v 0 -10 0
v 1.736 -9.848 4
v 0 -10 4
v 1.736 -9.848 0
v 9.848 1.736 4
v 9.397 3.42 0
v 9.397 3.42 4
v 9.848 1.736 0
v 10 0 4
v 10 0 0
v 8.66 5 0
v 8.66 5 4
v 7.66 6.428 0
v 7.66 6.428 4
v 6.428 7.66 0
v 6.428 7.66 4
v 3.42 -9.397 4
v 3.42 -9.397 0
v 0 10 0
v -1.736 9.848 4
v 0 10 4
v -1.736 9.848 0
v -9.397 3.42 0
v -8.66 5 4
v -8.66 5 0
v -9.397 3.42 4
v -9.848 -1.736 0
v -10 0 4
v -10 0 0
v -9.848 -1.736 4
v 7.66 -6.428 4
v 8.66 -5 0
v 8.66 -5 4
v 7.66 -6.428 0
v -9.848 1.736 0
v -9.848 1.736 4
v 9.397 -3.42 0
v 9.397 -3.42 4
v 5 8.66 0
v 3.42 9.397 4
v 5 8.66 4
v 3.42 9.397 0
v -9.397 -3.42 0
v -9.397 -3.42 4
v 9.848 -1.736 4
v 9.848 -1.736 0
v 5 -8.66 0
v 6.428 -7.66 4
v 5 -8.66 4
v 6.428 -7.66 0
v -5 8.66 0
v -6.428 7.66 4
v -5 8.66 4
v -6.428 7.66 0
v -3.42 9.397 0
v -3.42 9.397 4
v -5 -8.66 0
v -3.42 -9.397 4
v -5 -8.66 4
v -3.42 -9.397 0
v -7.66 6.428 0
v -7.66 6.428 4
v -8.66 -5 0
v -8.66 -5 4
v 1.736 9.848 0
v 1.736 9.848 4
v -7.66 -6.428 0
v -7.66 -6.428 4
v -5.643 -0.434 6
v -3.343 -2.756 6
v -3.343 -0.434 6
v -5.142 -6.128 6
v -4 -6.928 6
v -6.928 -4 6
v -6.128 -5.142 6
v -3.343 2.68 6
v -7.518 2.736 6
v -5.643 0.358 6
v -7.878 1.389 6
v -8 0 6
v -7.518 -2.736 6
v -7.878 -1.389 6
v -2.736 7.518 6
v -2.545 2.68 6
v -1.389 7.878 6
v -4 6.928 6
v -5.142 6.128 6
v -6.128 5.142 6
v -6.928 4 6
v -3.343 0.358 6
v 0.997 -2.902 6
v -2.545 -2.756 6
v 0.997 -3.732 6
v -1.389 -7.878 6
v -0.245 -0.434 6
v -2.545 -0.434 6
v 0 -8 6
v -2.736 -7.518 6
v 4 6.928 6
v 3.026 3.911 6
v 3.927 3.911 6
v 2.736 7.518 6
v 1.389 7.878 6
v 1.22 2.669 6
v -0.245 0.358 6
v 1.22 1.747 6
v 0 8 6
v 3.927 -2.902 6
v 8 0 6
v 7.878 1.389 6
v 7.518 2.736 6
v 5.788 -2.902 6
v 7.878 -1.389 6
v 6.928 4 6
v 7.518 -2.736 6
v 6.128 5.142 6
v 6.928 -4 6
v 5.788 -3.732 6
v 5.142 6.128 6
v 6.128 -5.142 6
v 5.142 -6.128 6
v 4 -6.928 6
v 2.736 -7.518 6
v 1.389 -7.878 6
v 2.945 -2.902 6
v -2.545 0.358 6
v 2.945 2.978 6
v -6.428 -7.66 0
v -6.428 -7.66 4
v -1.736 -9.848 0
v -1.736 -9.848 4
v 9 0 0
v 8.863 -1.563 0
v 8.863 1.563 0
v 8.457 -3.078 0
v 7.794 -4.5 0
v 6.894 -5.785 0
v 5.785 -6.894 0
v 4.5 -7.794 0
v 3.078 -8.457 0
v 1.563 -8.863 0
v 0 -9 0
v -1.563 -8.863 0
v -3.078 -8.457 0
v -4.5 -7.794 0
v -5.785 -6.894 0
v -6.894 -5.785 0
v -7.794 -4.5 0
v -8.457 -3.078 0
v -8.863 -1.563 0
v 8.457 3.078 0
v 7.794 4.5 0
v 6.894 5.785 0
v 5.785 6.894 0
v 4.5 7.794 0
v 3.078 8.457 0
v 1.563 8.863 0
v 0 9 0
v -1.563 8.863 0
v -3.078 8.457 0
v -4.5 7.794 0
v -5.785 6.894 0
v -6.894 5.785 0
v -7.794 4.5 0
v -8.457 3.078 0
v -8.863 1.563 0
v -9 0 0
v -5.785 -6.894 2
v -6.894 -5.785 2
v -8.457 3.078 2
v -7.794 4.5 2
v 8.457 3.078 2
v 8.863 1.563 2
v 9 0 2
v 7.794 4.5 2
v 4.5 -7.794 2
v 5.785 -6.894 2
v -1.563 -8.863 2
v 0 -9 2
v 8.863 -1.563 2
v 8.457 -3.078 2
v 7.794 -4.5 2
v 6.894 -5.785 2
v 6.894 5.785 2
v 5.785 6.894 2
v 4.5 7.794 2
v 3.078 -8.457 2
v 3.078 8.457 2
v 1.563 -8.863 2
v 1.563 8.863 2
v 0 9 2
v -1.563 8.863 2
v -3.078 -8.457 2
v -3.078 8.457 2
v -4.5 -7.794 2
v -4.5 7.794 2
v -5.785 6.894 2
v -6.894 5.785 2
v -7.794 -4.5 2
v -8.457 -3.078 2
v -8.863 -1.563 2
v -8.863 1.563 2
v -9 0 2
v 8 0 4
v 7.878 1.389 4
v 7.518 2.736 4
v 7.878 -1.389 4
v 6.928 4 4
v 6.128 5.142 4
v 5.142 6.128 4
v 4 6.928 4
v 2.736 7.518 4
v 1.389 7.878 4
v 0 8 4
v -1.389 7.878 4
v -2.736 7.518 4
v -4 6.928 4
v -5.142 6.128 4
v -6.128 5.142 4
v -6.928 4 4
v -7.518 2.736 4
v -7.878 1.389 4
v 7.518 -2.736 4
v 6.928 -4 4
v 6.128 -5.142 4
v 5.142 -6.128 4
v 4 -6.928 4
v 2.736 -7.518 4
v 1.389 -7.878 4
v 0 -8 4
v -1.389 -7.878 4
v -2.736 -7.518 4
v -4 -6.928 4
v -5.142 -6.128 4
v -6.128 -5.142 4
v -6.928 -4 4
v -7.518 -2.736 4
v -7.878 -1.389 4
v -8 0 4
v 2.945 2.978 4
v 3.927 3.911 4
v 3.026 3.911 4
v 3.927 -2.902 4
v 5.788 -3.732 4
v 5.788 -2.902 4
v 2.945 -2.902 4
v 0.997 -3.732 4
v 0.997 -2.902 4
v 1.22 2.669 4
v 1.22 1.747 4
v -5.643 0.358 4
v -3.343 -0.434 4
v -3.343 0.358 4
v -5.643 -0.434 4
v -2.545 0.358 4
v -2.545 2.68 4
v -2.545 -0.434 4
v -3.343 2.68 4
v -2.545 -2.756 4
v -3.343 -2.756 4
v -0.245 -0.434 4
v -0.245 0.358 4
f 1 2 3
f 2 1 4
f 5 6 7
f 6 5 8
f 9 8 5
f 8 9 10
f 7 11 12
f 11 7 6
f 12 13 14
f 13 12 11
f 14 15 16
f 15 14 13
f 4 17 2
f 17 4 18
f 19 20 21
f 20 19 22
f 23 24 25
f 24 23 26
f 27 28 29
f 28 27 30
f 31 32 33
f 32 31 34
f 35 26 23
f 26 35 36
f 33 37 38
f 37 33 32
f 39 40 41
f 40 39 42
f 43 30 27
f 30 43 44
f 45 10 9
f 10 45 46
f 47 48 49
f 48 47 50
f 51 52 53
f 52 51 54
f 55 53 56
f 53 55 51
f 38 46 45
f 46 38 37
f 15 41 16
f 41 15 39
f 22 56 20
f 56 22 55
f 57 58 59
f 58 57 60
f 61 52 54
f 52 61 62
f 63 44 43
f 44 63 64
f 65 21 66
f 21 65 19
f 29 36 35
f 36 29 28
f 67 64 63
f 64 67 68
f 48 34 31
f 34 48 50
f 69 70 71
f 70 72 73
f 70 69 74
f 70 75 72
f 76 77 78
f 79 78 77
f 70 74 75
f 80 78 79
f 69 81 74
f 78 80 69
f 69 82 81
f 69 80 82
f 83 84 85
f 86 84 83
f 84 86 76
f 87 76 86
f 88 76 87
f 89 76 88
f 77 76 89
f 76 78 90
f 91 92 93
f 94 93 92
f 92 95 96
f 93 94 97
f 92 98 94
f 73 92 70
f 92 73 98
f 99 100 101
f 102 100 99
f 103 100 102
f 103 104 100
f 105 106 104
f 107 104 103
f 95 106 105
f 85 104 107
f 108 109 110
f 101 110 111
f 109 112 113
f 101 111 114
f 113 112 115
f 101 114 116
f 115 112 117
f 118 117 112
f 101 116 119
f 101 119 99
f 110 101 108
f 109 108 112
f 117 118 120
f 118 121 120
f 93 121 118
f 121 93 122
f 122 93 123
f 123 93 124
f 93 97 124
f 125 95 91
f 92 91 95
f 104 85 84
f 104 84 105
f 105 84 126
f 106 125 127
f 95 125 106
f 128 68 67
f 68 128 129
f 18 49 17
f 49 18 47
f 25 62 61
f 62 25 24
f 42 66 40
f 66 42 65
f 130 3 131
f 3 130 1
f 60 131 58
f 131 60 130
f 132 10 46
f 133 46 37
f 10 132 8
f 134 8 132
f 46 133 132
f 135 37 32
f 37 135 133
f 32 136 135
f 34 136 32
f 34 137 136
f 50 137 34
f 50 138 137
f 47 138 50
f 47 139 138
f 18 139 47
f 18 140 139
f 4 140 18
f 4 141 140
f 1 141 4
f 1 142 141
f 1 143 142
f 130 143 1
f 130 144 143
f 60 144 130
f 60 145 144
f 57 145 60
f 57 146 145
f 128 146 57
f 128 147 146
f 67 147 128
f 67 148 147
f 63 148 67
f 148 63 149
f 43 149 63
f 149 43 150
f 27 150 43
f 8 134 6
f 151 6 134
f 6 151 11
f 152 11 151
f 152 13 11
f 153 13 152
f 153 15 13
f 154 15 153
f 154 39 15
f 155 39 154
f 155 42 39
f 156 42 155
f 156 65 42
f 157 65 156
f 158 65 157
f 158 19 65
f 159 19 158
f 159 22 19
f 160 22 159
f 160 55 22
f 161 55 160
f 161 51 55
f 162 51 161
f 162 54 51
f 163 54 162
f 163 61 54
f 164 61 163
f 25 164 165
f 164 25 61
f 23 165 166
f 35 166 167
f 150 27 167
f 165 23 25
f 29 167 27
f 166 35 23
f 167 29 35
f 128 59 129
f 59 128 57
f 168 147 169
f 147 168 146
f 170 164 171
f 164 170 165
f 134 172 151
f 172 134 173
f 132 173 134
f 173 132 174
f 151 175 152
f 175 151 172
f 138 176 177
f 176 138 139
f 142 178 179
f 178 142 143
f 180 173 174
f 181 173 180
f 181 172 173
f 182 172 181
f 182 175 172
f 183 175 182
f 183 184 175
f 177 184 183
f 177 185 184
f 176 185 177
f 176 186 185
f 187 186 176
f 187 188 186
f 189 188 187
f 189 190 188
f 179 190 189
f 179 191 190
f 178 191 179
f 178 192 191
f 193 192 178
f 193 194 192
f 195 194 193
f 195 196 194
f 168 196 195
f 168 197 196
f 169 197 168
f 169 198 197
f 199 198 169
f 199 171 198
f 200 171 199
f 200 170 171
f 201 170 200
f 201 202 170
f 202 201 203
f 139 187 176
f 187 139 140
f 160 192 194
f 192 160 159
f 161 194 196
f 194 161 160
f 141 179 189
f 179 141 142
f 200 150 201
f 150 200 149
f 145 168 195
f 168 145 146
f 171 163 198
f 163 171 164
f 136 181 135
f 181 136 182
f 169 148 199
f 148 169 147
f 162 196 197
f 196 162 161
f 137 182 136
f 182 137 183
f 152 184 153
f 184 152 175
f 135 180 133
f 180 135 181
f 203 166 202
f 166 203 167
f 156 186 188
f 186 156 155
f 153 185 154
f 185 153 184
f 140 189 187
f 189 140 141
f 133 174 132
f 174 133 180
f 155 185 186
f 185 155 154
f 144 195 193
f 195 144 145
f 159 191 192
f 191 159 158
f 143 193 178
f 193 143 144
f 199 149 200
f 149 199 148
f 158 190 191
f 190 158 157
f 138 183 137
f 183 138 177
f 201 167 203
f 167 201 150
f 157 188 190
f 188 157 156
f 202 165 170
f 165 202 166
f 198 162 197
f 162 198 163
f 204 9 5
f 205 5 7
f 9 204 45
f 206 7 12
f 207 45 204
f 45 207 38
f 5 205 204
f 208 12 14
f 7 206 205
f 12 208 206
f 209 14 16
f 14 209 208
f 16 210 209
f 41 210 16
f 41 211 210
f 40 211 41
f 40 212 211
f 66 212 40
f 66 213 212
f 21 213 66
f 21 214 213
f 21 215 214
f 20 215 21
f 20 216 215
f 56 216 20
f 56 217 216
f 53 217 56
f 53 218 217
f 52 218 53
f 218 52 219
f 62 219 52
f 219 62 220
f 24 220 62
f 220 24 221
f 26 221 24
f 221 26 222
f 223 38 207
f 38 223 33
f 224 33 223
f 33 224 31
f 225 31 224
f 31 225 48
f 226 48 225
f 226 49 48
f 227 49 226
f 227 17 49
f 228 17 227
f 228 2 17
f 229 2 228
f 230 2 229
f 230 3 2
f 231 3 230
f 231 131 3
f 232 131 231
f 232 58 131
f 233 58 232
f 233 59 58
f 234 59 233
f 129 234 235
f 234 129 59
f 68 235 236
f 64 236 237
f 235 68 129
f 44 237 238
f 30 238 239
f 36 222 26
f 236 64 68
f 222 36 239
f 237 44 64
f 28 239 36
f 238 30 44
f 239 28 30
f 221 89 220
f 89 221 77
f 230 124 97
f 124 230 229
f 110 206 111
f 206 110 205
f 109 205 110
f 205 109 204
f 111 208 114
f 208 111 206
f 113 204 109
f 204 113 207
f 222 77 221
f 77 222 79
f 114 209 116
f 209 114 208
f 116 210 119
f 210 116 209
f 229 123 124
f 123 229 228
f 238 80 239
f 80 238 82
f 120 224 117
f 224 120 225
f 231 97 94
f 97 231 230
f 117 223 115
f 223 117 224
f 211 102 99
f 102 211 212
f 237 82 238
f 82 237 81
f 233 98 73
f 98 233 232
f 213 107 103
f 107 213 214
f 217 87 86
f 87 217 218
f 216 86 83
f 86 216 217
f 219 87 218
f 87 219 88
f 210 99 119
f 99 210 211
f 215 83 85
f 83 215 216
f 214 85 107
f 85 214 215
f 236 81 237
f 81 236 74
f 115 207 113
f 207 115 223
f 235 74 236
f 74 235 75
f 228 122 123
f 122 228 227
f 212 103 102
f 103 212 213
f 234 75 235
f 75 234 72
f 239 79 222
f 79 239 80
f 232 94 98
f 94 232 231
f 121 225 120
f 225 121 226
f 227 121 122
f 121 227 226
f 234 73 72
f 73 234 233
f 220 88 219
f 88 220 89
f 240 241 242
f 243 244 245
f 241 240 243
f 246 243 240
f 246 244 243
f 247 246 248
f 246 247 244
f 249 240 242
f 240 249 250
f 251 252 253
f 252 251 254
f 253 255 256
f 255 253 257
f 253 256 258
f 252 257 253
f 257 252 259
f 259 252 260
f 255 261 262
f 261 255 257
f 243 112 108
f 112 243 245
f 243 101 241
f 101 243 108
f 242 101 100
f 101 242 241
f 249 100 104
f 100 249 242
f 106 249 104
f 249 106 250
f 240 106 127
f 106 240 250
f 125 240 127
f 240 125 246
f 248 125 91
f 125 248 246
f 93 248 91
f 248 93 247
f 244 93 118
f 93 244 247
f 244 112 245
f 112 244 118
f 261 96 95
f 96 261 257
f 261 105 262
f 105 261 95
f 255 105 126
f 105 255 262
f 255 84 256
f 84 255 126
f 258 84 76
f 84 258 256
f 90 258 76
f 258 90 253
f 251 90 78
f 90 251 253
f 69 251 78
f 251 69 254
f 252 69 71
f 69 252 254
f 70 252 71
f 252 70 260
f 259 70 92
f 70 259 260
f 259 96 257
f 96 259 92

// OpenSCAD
difference() {
	difference() {
		difference() {
			cylinder($fn = 36, h = 6, r = 10);
			translate(v = [0, 0, -1]) {
				cylinder($fn = 36, h = 3, r = 9);
			}
		}
		translate(v = [0, 0, 4]) {
			difference() {
				cylinder($fn = 36, h = 3, r = 10.5000000000);
				cylinder($fn = 36, h = 3, r = 8);
			}
		}
	}
	translate(v = [0, 0, 4]) {
		linear_extrude(height = 3) {
			text(halign = "center", size = 8, text = "+1", valign = "center");
		}
	}
}
